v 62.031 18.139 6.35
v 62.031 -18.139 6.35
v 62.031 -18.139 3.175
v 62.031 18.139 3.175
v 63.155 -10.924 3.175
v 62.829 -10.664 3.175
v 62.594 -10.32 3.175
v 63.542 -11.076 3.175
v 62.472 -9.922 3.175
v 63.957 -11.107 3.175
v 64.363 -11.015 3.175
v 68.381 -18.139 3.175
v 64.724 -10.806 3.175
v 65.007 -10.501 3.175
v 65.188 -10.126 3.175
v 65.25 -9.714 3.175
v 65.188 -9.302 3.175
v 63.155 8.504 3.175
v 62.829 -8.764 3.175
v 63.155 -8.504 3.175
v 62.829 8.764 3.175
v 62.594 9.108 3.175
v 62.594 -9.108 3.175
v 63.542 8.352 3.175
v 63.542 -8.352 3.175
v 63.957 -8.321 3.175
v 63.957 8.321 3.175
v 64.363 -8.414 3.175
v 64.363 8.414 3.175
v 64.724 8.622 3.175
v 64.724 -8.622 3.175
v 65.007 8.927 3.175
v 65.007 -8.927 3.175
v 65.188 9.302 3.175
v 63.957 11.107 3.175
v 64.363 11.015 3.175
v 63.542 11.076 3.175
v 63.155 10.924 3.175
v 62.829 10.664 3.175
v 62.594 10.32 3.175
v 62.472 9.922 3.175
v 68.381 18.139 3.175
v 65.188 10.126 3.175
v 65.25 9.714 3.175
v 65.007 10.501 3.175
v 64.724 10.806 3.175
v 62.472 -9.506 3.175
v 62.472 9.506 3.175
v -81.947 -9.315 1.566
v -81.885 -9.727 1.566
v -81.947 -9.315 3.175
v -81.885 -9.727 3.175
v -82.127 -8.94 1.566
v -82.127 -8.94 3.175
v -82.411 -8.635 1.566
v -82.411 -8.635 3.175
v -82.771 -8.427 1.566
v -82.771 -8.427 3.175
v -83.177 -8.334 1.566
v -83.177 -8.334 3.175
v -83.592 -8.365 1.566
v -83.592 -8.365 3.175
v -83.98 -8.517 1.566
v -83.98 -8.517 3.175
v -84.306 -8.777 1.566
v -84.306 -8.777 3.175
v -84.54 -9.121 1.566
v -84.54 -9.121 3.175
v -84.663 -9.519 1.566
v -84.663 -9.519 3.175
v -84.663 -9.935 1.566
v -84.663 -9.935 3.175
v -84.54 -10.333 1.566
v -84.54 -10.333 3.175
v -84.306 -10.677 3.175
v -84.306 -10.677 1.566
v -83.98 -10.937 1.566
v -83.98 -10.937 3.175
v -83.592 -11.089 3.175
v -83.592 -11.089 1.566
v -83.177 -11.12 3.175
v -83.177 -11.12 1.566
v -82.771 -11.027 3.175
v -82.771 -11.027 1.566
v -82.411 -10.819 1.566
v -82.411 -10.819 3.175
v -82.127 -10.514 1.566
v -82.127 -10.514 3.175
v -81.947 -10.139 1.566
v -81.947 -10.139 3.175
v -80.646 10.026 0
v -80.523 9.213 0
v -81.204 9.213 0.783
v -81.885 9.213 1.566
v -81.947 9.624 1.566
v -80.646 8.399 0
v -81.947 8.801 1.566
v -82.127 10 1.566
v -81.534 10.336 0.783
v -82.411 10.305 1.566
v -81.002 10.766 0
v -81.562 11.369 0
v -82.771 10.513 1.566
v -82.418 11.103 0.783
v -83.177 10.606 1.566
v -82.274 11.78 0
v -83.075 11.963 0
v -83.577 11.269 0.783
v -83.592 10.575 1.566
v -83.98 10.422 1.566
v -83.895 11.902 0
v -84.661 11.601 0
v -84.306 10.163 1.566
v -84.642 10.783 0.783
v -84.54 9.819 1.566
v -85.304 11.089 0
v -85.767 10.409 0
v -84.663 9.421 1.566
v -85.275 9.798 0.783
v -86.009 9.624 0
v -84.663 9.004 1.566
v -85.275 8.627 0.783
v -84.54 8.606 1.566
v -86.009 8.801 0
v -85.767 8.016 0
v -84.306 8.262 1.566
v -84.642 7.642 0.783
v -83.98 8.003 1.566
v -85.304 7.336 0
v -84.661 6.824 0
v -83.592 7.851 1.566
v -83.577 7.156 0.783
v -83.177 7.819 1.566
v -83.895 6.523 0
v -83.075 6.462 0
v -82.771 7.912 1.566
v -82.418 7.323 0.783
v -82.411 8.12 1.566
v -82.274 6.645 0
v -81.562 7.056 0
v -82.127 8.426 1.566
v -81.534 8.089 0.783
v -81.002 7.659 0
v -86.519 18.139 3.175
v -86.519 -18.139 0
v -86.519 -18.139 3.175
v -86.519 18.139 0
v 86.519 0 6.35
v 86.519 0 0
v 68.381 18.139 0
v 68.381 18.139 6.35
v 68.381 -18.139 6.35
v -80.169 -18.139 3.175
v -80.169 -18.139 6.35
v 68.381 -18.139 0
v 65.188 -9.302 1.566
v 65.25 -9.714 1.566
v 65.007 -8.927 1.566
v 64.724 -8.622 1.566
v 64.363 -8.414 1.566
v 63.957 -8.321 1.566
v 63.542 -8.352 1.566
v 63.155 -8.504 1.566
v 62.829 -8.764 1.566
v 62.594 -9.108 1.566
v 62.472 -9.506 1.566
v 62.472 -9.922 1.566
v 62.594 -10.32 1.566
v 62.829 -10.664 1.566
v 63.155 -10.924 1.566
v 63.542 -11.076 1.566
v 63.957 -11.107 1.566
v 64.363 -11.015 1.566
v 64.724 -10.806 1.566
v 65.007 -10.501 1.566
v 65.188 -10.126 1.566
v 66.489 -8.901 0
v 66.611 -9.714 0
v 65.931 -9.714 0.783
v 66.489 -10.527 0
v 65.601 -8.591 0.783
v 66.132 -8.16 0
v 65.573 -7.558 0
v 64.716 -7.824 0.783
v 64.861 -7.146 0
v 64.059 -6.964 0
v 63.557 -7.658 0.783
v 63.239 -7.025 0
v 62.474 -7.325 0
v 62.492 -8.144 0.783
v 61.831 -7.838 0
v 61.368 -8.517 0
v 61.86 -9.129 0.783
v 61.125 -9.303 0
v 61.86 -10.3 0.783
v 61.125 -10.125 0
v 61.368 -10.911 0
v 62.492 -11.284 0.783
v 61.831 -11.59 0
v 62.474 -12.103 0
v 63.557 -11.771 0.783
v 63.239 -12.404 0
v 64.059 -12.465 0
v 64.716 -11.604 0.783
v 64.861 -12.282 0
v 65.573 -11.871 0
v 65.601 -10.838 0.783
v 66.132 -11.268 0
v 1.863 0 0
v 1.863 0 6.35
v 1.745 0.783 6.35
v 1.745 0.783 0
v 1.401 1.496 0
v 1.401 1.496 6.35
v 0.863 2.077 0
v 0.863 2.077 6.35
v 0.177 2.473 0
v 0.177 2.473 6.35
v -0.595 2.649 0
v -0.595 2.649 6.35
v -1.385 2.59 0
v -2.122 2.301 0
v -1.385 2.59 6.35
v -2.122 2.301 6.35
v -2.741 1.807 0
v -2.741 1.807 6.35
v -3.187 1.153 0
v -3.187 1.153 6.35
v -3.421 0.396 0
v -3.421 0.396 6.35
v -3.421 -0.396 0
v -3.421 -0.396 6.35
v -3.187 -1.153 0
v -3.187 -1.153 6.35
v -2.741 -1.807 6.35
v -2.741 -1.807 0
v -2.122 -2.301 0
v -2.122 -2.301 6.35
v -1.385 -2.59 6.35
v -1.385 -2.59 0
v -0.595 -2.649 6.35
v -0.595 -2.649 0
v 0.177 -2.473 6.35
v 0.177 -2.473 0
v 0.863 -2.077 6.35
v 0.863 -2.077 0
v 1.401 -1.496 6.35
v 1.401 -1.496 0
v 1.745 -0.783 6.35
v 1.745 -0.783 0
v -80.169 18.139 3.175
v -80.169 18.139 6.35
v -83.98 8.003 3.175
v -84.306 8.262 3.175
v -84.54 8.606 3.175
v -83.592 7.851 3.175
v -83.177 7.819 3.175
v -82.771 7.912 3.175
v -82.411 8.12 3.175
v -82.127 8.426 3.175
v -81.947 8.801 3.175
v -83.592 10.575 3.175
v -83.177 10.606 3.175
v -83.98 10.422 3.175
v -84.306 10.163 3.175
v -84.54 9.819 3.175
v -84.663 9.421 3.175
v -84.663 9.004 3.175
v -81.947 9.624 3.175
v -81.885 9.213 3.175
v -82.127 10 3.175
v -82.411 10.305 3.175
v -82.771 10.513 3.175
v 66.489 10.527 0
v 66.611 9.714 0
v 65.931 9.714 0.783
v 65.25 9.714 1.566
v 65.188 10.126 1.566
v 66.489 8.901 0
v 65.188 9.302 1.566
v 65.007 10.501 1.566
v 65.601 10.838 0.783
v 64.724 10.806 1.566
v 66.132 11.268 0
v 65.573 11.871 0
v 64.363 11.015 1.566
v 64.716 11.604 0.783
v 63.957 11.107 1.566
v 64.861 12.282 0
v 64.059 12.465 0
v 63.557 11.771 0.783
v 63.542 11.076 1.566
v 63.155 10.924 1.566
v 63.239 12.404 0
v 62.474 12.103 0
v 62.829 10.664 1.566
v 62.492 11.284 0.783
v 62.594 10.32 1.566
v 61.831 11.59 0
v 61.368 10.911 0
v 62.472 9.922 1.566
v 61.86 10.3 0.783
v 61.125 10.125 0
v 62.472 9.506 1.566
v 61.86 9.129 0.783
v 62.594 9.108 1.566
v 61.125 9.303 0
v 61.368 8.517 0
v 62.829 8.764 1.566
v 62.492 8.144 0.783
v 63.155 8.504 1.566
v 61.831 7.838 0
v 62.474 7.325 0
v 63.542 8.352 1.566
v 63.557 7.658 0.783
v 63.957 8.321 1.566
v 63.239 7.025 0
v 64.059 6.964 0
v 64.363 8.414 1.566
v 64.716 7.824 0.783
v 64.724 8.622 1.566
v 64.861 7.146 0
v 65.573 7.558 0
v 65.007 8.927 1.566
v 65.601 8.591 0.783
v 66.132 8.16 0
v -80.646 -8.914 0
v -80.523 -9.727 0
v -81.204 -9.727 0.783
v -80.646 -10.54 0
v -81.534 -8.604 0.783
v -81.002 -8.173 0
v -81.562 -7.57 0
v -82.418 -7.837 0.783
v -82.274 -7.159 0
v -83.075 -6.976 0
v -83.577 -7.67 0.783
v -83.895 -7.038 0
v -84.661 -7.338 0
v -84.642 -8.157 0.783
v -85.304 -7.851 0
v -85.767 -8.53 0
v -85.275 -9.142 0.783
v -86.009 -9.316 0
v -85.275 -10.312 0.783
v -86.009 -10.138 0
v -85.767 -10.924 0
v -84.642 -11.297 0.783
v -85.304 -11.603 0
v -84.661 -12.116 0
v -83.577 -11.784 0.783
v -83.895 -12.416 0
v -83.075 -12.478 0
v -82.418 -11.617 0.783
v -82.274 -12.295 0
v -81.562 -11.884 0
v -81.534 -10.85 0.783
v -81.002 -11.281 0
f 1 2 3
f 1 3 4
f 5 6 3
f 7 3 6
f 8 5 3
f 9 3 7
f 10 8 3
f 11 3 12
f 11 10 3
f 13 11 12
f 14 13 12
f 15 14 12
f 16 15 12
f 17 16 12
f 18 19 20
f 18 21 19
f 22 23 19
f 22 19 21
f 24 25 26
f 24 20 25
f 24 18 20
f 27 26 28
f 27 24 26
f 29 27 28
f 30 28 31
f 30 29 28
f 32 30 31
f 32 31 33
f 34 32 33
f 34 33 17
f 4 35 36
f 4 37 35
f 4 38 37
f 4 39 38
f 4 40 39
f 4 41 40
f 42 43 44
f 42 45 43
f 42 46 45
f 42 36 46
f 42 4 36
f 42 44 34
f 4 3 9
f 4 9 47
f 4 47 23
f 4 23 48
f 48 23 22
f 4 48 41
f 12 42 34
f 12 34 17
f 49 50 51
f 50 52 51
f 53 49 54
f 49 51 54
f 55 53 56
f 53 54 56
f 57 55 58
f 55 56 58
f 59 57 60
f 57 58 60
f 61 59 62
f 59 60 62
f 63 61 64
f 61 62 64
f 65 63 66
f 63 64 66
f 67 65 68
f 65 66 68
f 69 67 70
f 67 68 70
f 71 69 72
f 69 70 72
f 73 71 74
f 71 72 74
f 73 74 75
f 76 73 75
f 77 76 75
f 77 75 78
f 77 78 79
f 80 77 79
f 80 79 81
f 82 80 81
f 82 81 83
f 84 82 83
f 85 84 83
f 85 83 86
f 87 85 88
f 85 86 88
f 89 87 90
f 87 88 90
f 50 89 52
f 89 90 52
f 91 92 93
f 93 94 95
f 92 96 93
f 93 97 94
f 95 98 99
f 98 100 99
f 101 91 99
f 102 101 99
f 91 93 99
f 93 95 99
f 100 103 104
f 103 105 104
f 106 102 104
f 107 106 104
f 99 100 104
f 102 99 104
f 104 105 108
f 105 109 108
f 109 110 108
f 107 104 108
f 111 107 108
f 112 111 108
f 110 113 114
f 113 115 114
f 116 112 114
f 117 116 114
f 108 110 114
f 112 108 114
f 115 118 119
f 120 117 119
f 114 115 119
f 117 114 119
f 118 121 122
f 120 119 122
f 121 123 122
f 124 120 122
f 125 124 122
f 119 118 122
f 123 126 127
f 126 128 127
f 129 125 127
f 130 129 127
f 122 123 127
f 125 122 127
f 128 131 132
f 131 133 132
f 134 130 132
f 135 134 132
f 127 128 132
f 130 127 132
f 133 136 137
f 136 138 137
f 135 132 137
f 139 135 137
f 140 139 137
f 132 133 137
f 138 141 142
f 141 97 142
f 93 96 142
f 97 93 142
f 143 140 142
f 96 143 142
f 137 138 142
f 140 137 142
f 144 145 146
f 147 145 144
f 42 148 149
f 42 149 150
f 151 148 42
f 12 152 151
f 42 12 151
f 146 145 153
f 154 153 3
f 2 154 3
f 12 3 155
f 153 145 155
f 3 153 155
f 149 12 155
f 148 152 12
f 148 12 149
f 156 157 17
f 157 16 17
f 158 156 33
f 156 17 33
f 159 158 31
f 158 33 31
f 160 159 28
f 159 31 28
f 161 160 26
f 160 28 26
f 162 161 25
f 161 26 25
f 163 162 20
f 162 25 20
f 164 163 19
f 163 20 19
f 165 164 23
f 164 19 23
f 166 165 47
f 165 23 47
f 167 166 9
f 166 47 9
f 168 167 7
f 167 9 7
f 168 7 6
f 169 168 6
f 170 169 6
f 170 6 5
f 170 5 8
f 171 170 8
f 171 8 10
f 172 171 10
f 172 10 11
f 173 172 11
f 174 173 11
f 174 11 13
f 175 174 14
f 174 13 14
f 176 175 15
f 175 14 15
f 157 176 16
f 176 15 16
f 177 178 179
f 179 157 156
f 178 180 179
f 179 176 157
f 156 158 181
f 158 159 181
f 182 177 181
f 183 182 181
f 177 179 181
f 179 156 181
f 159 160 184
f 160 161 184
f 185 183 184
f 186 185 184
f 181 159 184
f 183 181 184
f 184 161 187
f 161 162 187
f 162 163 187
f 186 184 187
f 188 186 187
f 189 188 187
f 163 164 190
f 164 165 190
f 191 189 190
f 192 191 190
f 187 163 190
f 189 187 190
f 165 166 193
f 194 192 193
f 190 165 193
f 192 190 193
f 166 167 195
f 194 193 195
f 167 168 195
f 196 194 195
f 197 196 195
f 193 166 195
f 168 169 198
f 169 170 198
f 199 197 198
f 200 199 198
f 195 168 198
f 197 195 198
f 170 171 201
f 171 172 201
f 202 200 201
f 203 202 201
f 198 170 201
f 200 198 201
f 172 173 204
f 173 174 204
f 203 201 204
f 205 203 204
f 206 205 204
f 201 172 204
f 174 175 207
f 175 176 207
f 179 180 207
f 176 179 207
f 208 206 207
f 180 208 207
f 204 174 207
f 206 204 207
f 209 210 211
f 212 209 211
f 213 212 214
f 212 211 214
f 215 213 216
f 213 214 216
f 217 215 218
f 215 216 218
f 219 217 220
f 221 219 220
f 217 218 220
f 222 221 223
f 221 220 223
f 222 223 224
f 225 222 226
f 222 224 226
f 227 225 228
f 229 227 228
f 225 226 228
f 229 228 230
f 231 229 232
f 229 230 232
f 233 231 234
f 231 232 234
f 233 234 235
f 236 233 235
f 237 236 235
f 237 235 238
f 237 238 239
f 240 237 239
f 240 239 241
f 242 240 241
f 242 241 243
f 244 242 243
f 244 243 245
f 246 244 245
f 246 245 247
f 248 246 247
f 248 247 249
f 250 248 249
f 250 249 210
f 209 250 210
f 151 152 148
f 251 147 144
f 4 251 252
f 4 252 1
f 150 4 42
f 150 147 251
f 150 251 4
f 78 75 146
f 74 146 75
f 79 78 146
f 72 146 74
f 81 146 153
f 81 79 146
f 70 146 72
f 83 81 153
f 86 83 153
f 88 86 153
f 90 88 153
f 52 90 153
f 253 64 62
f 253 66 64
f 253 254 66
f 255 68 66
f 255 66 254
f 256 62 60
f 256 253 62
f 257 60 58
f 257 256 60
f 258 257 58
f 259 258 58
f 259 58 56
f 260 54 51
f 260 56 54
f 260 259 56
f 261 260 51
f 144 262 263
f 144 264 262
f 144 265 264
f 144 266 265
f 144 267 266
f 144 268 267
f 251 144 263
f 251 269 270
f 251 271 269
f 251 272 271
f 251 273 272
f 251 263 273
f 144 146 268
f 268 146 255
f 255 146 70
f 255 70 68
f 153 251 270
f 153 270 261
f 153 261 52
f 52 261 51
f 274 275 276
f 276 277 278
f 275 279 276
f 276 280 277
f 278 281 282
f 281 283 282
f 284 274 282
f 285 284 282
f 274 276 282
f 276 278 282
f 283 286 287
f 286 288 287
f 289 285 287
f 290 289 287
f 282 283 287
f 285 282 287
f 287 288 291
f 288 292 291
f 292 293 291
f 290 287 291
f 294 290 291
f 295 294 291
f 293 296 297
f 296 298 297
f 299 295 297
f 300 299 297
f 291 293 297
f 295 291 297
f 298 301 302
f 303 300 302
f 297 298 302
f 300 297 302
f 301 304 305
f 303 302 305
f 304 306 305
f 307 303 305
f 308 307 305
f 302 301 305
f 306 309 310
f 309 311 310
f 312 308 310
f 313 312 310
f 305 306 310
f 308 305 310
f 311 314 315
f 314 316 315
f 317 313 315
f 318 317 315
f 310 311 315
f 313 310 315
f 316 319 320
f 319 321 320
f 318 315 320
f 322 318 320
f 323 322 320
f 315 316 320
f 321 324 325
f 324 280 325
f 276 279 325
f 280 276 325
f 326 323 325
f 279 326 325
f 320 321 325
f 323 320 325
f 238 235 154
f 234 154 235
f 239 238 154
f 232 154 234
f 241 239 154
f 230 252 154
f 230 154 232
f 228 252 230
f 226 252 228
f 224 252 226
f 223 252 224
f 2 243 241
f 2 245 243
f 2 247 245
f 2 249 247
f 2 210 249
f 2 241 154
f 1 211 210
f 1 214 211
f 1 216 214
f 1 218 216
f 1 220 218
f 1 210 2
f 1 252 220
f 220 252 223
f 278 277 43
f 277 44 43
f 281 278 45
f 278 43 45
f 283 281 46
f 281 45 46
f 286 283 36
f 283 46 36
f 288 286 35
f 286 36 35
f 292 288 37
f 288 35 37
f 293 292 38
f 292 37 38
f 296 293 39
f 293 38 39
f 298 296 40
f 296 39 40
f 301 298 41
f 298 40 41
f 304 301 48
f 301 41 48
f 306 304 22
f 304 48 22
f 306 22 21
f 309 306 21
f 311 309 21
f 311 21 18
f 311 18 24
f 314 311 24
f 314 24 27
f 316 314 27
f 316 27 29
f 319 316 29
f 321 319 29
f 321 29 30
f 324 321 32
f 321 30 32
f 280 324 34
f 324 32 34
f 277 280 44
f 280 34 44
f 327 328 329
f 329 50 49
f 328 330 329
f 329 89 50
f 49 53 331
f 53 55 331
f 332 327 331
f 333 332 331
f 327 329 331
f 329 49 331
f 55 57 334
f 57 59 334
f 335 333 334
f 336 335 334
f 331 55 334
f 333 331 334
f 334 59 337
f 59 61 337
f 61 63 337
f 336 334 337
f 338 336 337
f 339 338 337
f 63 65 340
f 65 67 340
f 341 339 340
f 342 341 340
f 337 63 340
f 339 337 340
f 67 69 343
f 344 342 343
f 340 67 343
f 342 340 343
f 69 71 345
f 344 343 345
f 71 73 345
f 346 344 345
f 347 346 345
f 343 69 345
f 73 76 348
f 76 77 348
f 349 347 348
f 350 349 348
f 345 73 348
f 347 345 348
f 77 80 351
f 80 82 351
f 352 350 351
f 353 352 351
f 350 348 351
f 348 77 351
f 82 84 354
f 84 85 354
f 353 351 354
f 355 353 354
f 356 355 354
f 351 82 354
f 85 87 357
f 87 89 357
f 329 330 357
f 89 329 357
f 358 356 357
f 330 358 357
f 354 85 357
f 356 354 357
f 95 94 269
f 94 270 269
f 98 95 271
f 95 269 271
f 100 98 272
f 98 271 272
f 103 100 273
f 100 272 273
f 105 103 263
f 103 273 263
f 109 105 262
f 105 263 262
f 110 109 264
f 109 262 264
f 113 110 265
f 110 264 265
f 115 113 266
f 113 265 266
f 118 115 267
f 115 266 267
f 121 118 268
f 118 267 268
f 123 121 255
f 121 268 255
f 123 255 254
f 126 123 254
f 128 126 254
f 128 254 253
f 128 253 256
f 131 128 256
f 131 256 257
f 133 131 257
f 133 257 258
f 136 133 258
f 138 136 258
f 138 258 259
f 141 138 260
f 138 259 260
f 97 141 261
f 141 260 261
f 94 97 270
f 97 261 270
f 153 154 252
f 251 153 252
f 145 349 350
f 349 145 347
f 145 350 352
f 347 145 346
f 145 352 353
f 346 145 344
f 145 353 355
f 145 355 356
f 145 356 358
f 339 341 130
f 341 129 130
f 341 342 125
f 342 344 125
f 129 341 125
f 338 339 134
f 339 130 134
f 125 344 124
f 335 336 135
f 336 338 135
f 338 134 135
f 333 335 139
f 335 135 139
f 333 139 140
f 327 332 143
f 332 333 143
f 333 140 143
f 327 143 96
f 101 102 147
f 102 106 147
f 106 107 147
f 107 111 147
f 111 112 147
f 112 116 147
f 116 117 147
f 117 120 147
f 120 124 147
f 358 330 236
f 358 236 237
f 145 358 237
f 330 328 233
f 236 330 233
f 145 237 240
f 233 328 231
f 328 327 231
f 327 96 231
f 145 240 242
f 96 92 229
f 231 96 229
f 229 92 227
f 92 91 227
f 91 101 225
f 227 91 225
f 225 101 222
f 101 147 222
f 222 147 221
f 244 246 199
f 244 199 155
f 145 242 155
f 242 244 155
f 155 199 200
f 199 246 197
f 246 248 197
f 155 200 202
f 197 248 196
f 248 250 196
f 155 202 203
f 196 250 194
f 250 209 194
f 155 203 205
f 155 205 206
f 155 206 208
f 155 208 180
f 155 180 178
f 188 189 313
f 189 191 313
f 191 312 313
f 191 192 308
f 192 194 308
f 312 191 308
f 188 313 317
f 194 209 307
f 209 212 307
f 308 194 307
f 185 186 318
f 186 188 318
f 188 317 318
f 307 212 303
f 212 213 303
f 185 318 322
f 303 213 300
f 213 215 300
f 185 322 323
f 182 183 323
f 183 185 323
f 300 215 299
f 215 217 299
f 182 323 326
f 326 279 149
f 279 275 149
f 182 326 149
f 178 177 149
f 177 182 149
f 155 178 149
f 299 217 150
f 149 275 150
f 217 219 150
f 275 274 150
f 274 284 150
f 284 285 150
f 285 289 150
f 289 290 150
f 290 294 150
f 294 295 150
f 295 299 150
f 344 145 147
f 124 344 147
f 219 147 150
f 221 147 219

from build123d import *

# Parameters (mm, degrees)
SKETCH1_W                                         = 173.0375
SKETCH1_H                                         = 36.27882
EXTRUDE2_DEPTH                                    = 6.35
SKETCH8_W                                         = 6.35
SKETCH8_H                                         = 36.27882
EXTRUDE7_DEPTH                                    = 3.175
CSK_FOR_3_FLAT_HEAD_SOCKET_CAP_SCREW1_D           = 2.794
CSK_FOR_3_FLAT_HEAD_SOCKET_CAP_SCREW1_CSINK_D     = 5.51688
CSK_FOR_3_FLAT_HEAD_SOCKET_CAP_SCREW1_CSINK_ANGLE = 82
CSK_FOR_3_FLAT_HEAD_SOCKET_CAP_SCREW2_D           = 2.794
CSK_FOR_3_FLAT_HEAD_SOCKET_CAP_SCREW2_CSINK_D     = 5.51688
CSK_FOR_3_FLAT_HEAD_SOCKET_CAP_SCREW2_CSINK_ANGLE = 82
CSK_FOR_3_FLAT_HEAD_SOCKET_CAP_SCREW3_D           = 2.794
CSK_FOR_3_FLAT_HEAD_SOCKET_CAP_SCREW3_CSINK_D     = 5.51688
CSK_FOR_3_FLAT_HEAD_SOCKET_CAP_SCREW3_CSINK_ANGLE = 82
EXTRUDE8_DEPTH                                    = 89.627618702
SKETCH19_R                                        = 2.656568676
EXTRUDE9_DEPTH                                    = 89.627618702


with BuildPart() as part:
    # Sketch1 → Extrude2 (new body)
    with BuildSketch(Plane.XY):
        Rectangle(SKETCH1_W, SKETCH1_H)
    extrude(amount=EXTRUDE2_DEPTH)

    # Sketch8 → Extrude7 (cut)
    with BuildSketch(Plane.XY.offset(6.35)):
        with Locations((-83.34375, 0)):
            Rectangle(SKETCH8_W, SKETCH8_H)
        with Locations((65.20561, 0)):
            Rectangle(SKETCH8_W, SKETCH8_H)
    extrude(amount=-EXTRUDE7_DEPTH, mode=Mode.SUBTRACT)

    # CSK for #3 Flat Head Socket Cap Screw1 (through all)
    with Locations(Plane(origin=(-27.747731188, -5.395978674, 0), x_dir=(-1, 0, 0), z_dir=(0, 0, -1))):
        with Locations((55.533788812, -4.331019161)):
            CounterSinkHole(CSK_FOR_3_FLAT_HEAD_SOCKET_CAP_SCREW1_D / 2, CSK_FOR_3_FLAT_HEAD_SOCKET_CAP_SCREW1_CSINK_D / 2, counter_sink_angle=CSK_FOR_3_FLAT_HEAD_SOCKET_CAP_SCREW1_CSINK_ANGLE)

    # CSK for #3 Flat Head Socket Cap Screw2 (through all)
    with Locations(Plane(origin=(-27.747731188, -5.395978674, 0), x_dir=(-1, 0, 0), z_dir=(0, 0, -1))):
        with Locations((55.533788812, 14.608526561)):
            CounterSinkHole(CSK_FOR_3_FLAT_HEAD_SOCKET_CAP_SCREW2_D / 2, CSK_FOR_3_FLAT_HEAD_SOCKET_CAP_SCREW2_CSINK_D / 2, counter_sink_angle=CSK_FOR_3_FLAT_HEAD_SOCKET_CAP_SCREW2_CSINK_ANGLE)

    # CSK for #3 Flat Head Socket Cap Screw3 (through all)
    with Locations(Plane(origin=(-27.747731188, -5.395978674, 0), x_dir=(-1, 0, 0), z_dir=(0, 0, -1))):
        with Locations((-91.600791188, -4.318251326), (-91.600791188, 15.110208674)):
            CounterSinkHole(CSK_FOR_3_FLAT_HEAD_SOCKET_CAP_SCREW3_D / 2, CSK_FOR_3_FLAT_HEAD_SOCKET_CAP_SCREW3_CSINK_D / 2, counter_sink_angle=CSK_FOR_3_FLAT_HEAD_SOCKET_CAP_SCREW3_CSINK_ANGLE)

    # Sketch18 → Extrude8 (cut, through all)
    with BuildSketch(Plane.XY.offset(6.35)):
        Polygon((86.51875, 0), (68.38061, 18.13941), (113.519162523, 18.13941), (113.519162523, -18.13941), (68.38061, -18.13941), align=None)
    extrude(amount=-EXTRUDE8_DEPTH, mode=Mode.SUBTRACT)

    # Sketch19 → Extrude9 (cut, through all)
    with BuildSketch(Plane.XY.offset(6.35)):
        with Locations((-0.79375, 0)):
            Circle(SKETCH19_R)
    extrude(amount=-EXTRUDE9_DEPTH, mode=Mode.SUBTRACT)


solid = part.part
